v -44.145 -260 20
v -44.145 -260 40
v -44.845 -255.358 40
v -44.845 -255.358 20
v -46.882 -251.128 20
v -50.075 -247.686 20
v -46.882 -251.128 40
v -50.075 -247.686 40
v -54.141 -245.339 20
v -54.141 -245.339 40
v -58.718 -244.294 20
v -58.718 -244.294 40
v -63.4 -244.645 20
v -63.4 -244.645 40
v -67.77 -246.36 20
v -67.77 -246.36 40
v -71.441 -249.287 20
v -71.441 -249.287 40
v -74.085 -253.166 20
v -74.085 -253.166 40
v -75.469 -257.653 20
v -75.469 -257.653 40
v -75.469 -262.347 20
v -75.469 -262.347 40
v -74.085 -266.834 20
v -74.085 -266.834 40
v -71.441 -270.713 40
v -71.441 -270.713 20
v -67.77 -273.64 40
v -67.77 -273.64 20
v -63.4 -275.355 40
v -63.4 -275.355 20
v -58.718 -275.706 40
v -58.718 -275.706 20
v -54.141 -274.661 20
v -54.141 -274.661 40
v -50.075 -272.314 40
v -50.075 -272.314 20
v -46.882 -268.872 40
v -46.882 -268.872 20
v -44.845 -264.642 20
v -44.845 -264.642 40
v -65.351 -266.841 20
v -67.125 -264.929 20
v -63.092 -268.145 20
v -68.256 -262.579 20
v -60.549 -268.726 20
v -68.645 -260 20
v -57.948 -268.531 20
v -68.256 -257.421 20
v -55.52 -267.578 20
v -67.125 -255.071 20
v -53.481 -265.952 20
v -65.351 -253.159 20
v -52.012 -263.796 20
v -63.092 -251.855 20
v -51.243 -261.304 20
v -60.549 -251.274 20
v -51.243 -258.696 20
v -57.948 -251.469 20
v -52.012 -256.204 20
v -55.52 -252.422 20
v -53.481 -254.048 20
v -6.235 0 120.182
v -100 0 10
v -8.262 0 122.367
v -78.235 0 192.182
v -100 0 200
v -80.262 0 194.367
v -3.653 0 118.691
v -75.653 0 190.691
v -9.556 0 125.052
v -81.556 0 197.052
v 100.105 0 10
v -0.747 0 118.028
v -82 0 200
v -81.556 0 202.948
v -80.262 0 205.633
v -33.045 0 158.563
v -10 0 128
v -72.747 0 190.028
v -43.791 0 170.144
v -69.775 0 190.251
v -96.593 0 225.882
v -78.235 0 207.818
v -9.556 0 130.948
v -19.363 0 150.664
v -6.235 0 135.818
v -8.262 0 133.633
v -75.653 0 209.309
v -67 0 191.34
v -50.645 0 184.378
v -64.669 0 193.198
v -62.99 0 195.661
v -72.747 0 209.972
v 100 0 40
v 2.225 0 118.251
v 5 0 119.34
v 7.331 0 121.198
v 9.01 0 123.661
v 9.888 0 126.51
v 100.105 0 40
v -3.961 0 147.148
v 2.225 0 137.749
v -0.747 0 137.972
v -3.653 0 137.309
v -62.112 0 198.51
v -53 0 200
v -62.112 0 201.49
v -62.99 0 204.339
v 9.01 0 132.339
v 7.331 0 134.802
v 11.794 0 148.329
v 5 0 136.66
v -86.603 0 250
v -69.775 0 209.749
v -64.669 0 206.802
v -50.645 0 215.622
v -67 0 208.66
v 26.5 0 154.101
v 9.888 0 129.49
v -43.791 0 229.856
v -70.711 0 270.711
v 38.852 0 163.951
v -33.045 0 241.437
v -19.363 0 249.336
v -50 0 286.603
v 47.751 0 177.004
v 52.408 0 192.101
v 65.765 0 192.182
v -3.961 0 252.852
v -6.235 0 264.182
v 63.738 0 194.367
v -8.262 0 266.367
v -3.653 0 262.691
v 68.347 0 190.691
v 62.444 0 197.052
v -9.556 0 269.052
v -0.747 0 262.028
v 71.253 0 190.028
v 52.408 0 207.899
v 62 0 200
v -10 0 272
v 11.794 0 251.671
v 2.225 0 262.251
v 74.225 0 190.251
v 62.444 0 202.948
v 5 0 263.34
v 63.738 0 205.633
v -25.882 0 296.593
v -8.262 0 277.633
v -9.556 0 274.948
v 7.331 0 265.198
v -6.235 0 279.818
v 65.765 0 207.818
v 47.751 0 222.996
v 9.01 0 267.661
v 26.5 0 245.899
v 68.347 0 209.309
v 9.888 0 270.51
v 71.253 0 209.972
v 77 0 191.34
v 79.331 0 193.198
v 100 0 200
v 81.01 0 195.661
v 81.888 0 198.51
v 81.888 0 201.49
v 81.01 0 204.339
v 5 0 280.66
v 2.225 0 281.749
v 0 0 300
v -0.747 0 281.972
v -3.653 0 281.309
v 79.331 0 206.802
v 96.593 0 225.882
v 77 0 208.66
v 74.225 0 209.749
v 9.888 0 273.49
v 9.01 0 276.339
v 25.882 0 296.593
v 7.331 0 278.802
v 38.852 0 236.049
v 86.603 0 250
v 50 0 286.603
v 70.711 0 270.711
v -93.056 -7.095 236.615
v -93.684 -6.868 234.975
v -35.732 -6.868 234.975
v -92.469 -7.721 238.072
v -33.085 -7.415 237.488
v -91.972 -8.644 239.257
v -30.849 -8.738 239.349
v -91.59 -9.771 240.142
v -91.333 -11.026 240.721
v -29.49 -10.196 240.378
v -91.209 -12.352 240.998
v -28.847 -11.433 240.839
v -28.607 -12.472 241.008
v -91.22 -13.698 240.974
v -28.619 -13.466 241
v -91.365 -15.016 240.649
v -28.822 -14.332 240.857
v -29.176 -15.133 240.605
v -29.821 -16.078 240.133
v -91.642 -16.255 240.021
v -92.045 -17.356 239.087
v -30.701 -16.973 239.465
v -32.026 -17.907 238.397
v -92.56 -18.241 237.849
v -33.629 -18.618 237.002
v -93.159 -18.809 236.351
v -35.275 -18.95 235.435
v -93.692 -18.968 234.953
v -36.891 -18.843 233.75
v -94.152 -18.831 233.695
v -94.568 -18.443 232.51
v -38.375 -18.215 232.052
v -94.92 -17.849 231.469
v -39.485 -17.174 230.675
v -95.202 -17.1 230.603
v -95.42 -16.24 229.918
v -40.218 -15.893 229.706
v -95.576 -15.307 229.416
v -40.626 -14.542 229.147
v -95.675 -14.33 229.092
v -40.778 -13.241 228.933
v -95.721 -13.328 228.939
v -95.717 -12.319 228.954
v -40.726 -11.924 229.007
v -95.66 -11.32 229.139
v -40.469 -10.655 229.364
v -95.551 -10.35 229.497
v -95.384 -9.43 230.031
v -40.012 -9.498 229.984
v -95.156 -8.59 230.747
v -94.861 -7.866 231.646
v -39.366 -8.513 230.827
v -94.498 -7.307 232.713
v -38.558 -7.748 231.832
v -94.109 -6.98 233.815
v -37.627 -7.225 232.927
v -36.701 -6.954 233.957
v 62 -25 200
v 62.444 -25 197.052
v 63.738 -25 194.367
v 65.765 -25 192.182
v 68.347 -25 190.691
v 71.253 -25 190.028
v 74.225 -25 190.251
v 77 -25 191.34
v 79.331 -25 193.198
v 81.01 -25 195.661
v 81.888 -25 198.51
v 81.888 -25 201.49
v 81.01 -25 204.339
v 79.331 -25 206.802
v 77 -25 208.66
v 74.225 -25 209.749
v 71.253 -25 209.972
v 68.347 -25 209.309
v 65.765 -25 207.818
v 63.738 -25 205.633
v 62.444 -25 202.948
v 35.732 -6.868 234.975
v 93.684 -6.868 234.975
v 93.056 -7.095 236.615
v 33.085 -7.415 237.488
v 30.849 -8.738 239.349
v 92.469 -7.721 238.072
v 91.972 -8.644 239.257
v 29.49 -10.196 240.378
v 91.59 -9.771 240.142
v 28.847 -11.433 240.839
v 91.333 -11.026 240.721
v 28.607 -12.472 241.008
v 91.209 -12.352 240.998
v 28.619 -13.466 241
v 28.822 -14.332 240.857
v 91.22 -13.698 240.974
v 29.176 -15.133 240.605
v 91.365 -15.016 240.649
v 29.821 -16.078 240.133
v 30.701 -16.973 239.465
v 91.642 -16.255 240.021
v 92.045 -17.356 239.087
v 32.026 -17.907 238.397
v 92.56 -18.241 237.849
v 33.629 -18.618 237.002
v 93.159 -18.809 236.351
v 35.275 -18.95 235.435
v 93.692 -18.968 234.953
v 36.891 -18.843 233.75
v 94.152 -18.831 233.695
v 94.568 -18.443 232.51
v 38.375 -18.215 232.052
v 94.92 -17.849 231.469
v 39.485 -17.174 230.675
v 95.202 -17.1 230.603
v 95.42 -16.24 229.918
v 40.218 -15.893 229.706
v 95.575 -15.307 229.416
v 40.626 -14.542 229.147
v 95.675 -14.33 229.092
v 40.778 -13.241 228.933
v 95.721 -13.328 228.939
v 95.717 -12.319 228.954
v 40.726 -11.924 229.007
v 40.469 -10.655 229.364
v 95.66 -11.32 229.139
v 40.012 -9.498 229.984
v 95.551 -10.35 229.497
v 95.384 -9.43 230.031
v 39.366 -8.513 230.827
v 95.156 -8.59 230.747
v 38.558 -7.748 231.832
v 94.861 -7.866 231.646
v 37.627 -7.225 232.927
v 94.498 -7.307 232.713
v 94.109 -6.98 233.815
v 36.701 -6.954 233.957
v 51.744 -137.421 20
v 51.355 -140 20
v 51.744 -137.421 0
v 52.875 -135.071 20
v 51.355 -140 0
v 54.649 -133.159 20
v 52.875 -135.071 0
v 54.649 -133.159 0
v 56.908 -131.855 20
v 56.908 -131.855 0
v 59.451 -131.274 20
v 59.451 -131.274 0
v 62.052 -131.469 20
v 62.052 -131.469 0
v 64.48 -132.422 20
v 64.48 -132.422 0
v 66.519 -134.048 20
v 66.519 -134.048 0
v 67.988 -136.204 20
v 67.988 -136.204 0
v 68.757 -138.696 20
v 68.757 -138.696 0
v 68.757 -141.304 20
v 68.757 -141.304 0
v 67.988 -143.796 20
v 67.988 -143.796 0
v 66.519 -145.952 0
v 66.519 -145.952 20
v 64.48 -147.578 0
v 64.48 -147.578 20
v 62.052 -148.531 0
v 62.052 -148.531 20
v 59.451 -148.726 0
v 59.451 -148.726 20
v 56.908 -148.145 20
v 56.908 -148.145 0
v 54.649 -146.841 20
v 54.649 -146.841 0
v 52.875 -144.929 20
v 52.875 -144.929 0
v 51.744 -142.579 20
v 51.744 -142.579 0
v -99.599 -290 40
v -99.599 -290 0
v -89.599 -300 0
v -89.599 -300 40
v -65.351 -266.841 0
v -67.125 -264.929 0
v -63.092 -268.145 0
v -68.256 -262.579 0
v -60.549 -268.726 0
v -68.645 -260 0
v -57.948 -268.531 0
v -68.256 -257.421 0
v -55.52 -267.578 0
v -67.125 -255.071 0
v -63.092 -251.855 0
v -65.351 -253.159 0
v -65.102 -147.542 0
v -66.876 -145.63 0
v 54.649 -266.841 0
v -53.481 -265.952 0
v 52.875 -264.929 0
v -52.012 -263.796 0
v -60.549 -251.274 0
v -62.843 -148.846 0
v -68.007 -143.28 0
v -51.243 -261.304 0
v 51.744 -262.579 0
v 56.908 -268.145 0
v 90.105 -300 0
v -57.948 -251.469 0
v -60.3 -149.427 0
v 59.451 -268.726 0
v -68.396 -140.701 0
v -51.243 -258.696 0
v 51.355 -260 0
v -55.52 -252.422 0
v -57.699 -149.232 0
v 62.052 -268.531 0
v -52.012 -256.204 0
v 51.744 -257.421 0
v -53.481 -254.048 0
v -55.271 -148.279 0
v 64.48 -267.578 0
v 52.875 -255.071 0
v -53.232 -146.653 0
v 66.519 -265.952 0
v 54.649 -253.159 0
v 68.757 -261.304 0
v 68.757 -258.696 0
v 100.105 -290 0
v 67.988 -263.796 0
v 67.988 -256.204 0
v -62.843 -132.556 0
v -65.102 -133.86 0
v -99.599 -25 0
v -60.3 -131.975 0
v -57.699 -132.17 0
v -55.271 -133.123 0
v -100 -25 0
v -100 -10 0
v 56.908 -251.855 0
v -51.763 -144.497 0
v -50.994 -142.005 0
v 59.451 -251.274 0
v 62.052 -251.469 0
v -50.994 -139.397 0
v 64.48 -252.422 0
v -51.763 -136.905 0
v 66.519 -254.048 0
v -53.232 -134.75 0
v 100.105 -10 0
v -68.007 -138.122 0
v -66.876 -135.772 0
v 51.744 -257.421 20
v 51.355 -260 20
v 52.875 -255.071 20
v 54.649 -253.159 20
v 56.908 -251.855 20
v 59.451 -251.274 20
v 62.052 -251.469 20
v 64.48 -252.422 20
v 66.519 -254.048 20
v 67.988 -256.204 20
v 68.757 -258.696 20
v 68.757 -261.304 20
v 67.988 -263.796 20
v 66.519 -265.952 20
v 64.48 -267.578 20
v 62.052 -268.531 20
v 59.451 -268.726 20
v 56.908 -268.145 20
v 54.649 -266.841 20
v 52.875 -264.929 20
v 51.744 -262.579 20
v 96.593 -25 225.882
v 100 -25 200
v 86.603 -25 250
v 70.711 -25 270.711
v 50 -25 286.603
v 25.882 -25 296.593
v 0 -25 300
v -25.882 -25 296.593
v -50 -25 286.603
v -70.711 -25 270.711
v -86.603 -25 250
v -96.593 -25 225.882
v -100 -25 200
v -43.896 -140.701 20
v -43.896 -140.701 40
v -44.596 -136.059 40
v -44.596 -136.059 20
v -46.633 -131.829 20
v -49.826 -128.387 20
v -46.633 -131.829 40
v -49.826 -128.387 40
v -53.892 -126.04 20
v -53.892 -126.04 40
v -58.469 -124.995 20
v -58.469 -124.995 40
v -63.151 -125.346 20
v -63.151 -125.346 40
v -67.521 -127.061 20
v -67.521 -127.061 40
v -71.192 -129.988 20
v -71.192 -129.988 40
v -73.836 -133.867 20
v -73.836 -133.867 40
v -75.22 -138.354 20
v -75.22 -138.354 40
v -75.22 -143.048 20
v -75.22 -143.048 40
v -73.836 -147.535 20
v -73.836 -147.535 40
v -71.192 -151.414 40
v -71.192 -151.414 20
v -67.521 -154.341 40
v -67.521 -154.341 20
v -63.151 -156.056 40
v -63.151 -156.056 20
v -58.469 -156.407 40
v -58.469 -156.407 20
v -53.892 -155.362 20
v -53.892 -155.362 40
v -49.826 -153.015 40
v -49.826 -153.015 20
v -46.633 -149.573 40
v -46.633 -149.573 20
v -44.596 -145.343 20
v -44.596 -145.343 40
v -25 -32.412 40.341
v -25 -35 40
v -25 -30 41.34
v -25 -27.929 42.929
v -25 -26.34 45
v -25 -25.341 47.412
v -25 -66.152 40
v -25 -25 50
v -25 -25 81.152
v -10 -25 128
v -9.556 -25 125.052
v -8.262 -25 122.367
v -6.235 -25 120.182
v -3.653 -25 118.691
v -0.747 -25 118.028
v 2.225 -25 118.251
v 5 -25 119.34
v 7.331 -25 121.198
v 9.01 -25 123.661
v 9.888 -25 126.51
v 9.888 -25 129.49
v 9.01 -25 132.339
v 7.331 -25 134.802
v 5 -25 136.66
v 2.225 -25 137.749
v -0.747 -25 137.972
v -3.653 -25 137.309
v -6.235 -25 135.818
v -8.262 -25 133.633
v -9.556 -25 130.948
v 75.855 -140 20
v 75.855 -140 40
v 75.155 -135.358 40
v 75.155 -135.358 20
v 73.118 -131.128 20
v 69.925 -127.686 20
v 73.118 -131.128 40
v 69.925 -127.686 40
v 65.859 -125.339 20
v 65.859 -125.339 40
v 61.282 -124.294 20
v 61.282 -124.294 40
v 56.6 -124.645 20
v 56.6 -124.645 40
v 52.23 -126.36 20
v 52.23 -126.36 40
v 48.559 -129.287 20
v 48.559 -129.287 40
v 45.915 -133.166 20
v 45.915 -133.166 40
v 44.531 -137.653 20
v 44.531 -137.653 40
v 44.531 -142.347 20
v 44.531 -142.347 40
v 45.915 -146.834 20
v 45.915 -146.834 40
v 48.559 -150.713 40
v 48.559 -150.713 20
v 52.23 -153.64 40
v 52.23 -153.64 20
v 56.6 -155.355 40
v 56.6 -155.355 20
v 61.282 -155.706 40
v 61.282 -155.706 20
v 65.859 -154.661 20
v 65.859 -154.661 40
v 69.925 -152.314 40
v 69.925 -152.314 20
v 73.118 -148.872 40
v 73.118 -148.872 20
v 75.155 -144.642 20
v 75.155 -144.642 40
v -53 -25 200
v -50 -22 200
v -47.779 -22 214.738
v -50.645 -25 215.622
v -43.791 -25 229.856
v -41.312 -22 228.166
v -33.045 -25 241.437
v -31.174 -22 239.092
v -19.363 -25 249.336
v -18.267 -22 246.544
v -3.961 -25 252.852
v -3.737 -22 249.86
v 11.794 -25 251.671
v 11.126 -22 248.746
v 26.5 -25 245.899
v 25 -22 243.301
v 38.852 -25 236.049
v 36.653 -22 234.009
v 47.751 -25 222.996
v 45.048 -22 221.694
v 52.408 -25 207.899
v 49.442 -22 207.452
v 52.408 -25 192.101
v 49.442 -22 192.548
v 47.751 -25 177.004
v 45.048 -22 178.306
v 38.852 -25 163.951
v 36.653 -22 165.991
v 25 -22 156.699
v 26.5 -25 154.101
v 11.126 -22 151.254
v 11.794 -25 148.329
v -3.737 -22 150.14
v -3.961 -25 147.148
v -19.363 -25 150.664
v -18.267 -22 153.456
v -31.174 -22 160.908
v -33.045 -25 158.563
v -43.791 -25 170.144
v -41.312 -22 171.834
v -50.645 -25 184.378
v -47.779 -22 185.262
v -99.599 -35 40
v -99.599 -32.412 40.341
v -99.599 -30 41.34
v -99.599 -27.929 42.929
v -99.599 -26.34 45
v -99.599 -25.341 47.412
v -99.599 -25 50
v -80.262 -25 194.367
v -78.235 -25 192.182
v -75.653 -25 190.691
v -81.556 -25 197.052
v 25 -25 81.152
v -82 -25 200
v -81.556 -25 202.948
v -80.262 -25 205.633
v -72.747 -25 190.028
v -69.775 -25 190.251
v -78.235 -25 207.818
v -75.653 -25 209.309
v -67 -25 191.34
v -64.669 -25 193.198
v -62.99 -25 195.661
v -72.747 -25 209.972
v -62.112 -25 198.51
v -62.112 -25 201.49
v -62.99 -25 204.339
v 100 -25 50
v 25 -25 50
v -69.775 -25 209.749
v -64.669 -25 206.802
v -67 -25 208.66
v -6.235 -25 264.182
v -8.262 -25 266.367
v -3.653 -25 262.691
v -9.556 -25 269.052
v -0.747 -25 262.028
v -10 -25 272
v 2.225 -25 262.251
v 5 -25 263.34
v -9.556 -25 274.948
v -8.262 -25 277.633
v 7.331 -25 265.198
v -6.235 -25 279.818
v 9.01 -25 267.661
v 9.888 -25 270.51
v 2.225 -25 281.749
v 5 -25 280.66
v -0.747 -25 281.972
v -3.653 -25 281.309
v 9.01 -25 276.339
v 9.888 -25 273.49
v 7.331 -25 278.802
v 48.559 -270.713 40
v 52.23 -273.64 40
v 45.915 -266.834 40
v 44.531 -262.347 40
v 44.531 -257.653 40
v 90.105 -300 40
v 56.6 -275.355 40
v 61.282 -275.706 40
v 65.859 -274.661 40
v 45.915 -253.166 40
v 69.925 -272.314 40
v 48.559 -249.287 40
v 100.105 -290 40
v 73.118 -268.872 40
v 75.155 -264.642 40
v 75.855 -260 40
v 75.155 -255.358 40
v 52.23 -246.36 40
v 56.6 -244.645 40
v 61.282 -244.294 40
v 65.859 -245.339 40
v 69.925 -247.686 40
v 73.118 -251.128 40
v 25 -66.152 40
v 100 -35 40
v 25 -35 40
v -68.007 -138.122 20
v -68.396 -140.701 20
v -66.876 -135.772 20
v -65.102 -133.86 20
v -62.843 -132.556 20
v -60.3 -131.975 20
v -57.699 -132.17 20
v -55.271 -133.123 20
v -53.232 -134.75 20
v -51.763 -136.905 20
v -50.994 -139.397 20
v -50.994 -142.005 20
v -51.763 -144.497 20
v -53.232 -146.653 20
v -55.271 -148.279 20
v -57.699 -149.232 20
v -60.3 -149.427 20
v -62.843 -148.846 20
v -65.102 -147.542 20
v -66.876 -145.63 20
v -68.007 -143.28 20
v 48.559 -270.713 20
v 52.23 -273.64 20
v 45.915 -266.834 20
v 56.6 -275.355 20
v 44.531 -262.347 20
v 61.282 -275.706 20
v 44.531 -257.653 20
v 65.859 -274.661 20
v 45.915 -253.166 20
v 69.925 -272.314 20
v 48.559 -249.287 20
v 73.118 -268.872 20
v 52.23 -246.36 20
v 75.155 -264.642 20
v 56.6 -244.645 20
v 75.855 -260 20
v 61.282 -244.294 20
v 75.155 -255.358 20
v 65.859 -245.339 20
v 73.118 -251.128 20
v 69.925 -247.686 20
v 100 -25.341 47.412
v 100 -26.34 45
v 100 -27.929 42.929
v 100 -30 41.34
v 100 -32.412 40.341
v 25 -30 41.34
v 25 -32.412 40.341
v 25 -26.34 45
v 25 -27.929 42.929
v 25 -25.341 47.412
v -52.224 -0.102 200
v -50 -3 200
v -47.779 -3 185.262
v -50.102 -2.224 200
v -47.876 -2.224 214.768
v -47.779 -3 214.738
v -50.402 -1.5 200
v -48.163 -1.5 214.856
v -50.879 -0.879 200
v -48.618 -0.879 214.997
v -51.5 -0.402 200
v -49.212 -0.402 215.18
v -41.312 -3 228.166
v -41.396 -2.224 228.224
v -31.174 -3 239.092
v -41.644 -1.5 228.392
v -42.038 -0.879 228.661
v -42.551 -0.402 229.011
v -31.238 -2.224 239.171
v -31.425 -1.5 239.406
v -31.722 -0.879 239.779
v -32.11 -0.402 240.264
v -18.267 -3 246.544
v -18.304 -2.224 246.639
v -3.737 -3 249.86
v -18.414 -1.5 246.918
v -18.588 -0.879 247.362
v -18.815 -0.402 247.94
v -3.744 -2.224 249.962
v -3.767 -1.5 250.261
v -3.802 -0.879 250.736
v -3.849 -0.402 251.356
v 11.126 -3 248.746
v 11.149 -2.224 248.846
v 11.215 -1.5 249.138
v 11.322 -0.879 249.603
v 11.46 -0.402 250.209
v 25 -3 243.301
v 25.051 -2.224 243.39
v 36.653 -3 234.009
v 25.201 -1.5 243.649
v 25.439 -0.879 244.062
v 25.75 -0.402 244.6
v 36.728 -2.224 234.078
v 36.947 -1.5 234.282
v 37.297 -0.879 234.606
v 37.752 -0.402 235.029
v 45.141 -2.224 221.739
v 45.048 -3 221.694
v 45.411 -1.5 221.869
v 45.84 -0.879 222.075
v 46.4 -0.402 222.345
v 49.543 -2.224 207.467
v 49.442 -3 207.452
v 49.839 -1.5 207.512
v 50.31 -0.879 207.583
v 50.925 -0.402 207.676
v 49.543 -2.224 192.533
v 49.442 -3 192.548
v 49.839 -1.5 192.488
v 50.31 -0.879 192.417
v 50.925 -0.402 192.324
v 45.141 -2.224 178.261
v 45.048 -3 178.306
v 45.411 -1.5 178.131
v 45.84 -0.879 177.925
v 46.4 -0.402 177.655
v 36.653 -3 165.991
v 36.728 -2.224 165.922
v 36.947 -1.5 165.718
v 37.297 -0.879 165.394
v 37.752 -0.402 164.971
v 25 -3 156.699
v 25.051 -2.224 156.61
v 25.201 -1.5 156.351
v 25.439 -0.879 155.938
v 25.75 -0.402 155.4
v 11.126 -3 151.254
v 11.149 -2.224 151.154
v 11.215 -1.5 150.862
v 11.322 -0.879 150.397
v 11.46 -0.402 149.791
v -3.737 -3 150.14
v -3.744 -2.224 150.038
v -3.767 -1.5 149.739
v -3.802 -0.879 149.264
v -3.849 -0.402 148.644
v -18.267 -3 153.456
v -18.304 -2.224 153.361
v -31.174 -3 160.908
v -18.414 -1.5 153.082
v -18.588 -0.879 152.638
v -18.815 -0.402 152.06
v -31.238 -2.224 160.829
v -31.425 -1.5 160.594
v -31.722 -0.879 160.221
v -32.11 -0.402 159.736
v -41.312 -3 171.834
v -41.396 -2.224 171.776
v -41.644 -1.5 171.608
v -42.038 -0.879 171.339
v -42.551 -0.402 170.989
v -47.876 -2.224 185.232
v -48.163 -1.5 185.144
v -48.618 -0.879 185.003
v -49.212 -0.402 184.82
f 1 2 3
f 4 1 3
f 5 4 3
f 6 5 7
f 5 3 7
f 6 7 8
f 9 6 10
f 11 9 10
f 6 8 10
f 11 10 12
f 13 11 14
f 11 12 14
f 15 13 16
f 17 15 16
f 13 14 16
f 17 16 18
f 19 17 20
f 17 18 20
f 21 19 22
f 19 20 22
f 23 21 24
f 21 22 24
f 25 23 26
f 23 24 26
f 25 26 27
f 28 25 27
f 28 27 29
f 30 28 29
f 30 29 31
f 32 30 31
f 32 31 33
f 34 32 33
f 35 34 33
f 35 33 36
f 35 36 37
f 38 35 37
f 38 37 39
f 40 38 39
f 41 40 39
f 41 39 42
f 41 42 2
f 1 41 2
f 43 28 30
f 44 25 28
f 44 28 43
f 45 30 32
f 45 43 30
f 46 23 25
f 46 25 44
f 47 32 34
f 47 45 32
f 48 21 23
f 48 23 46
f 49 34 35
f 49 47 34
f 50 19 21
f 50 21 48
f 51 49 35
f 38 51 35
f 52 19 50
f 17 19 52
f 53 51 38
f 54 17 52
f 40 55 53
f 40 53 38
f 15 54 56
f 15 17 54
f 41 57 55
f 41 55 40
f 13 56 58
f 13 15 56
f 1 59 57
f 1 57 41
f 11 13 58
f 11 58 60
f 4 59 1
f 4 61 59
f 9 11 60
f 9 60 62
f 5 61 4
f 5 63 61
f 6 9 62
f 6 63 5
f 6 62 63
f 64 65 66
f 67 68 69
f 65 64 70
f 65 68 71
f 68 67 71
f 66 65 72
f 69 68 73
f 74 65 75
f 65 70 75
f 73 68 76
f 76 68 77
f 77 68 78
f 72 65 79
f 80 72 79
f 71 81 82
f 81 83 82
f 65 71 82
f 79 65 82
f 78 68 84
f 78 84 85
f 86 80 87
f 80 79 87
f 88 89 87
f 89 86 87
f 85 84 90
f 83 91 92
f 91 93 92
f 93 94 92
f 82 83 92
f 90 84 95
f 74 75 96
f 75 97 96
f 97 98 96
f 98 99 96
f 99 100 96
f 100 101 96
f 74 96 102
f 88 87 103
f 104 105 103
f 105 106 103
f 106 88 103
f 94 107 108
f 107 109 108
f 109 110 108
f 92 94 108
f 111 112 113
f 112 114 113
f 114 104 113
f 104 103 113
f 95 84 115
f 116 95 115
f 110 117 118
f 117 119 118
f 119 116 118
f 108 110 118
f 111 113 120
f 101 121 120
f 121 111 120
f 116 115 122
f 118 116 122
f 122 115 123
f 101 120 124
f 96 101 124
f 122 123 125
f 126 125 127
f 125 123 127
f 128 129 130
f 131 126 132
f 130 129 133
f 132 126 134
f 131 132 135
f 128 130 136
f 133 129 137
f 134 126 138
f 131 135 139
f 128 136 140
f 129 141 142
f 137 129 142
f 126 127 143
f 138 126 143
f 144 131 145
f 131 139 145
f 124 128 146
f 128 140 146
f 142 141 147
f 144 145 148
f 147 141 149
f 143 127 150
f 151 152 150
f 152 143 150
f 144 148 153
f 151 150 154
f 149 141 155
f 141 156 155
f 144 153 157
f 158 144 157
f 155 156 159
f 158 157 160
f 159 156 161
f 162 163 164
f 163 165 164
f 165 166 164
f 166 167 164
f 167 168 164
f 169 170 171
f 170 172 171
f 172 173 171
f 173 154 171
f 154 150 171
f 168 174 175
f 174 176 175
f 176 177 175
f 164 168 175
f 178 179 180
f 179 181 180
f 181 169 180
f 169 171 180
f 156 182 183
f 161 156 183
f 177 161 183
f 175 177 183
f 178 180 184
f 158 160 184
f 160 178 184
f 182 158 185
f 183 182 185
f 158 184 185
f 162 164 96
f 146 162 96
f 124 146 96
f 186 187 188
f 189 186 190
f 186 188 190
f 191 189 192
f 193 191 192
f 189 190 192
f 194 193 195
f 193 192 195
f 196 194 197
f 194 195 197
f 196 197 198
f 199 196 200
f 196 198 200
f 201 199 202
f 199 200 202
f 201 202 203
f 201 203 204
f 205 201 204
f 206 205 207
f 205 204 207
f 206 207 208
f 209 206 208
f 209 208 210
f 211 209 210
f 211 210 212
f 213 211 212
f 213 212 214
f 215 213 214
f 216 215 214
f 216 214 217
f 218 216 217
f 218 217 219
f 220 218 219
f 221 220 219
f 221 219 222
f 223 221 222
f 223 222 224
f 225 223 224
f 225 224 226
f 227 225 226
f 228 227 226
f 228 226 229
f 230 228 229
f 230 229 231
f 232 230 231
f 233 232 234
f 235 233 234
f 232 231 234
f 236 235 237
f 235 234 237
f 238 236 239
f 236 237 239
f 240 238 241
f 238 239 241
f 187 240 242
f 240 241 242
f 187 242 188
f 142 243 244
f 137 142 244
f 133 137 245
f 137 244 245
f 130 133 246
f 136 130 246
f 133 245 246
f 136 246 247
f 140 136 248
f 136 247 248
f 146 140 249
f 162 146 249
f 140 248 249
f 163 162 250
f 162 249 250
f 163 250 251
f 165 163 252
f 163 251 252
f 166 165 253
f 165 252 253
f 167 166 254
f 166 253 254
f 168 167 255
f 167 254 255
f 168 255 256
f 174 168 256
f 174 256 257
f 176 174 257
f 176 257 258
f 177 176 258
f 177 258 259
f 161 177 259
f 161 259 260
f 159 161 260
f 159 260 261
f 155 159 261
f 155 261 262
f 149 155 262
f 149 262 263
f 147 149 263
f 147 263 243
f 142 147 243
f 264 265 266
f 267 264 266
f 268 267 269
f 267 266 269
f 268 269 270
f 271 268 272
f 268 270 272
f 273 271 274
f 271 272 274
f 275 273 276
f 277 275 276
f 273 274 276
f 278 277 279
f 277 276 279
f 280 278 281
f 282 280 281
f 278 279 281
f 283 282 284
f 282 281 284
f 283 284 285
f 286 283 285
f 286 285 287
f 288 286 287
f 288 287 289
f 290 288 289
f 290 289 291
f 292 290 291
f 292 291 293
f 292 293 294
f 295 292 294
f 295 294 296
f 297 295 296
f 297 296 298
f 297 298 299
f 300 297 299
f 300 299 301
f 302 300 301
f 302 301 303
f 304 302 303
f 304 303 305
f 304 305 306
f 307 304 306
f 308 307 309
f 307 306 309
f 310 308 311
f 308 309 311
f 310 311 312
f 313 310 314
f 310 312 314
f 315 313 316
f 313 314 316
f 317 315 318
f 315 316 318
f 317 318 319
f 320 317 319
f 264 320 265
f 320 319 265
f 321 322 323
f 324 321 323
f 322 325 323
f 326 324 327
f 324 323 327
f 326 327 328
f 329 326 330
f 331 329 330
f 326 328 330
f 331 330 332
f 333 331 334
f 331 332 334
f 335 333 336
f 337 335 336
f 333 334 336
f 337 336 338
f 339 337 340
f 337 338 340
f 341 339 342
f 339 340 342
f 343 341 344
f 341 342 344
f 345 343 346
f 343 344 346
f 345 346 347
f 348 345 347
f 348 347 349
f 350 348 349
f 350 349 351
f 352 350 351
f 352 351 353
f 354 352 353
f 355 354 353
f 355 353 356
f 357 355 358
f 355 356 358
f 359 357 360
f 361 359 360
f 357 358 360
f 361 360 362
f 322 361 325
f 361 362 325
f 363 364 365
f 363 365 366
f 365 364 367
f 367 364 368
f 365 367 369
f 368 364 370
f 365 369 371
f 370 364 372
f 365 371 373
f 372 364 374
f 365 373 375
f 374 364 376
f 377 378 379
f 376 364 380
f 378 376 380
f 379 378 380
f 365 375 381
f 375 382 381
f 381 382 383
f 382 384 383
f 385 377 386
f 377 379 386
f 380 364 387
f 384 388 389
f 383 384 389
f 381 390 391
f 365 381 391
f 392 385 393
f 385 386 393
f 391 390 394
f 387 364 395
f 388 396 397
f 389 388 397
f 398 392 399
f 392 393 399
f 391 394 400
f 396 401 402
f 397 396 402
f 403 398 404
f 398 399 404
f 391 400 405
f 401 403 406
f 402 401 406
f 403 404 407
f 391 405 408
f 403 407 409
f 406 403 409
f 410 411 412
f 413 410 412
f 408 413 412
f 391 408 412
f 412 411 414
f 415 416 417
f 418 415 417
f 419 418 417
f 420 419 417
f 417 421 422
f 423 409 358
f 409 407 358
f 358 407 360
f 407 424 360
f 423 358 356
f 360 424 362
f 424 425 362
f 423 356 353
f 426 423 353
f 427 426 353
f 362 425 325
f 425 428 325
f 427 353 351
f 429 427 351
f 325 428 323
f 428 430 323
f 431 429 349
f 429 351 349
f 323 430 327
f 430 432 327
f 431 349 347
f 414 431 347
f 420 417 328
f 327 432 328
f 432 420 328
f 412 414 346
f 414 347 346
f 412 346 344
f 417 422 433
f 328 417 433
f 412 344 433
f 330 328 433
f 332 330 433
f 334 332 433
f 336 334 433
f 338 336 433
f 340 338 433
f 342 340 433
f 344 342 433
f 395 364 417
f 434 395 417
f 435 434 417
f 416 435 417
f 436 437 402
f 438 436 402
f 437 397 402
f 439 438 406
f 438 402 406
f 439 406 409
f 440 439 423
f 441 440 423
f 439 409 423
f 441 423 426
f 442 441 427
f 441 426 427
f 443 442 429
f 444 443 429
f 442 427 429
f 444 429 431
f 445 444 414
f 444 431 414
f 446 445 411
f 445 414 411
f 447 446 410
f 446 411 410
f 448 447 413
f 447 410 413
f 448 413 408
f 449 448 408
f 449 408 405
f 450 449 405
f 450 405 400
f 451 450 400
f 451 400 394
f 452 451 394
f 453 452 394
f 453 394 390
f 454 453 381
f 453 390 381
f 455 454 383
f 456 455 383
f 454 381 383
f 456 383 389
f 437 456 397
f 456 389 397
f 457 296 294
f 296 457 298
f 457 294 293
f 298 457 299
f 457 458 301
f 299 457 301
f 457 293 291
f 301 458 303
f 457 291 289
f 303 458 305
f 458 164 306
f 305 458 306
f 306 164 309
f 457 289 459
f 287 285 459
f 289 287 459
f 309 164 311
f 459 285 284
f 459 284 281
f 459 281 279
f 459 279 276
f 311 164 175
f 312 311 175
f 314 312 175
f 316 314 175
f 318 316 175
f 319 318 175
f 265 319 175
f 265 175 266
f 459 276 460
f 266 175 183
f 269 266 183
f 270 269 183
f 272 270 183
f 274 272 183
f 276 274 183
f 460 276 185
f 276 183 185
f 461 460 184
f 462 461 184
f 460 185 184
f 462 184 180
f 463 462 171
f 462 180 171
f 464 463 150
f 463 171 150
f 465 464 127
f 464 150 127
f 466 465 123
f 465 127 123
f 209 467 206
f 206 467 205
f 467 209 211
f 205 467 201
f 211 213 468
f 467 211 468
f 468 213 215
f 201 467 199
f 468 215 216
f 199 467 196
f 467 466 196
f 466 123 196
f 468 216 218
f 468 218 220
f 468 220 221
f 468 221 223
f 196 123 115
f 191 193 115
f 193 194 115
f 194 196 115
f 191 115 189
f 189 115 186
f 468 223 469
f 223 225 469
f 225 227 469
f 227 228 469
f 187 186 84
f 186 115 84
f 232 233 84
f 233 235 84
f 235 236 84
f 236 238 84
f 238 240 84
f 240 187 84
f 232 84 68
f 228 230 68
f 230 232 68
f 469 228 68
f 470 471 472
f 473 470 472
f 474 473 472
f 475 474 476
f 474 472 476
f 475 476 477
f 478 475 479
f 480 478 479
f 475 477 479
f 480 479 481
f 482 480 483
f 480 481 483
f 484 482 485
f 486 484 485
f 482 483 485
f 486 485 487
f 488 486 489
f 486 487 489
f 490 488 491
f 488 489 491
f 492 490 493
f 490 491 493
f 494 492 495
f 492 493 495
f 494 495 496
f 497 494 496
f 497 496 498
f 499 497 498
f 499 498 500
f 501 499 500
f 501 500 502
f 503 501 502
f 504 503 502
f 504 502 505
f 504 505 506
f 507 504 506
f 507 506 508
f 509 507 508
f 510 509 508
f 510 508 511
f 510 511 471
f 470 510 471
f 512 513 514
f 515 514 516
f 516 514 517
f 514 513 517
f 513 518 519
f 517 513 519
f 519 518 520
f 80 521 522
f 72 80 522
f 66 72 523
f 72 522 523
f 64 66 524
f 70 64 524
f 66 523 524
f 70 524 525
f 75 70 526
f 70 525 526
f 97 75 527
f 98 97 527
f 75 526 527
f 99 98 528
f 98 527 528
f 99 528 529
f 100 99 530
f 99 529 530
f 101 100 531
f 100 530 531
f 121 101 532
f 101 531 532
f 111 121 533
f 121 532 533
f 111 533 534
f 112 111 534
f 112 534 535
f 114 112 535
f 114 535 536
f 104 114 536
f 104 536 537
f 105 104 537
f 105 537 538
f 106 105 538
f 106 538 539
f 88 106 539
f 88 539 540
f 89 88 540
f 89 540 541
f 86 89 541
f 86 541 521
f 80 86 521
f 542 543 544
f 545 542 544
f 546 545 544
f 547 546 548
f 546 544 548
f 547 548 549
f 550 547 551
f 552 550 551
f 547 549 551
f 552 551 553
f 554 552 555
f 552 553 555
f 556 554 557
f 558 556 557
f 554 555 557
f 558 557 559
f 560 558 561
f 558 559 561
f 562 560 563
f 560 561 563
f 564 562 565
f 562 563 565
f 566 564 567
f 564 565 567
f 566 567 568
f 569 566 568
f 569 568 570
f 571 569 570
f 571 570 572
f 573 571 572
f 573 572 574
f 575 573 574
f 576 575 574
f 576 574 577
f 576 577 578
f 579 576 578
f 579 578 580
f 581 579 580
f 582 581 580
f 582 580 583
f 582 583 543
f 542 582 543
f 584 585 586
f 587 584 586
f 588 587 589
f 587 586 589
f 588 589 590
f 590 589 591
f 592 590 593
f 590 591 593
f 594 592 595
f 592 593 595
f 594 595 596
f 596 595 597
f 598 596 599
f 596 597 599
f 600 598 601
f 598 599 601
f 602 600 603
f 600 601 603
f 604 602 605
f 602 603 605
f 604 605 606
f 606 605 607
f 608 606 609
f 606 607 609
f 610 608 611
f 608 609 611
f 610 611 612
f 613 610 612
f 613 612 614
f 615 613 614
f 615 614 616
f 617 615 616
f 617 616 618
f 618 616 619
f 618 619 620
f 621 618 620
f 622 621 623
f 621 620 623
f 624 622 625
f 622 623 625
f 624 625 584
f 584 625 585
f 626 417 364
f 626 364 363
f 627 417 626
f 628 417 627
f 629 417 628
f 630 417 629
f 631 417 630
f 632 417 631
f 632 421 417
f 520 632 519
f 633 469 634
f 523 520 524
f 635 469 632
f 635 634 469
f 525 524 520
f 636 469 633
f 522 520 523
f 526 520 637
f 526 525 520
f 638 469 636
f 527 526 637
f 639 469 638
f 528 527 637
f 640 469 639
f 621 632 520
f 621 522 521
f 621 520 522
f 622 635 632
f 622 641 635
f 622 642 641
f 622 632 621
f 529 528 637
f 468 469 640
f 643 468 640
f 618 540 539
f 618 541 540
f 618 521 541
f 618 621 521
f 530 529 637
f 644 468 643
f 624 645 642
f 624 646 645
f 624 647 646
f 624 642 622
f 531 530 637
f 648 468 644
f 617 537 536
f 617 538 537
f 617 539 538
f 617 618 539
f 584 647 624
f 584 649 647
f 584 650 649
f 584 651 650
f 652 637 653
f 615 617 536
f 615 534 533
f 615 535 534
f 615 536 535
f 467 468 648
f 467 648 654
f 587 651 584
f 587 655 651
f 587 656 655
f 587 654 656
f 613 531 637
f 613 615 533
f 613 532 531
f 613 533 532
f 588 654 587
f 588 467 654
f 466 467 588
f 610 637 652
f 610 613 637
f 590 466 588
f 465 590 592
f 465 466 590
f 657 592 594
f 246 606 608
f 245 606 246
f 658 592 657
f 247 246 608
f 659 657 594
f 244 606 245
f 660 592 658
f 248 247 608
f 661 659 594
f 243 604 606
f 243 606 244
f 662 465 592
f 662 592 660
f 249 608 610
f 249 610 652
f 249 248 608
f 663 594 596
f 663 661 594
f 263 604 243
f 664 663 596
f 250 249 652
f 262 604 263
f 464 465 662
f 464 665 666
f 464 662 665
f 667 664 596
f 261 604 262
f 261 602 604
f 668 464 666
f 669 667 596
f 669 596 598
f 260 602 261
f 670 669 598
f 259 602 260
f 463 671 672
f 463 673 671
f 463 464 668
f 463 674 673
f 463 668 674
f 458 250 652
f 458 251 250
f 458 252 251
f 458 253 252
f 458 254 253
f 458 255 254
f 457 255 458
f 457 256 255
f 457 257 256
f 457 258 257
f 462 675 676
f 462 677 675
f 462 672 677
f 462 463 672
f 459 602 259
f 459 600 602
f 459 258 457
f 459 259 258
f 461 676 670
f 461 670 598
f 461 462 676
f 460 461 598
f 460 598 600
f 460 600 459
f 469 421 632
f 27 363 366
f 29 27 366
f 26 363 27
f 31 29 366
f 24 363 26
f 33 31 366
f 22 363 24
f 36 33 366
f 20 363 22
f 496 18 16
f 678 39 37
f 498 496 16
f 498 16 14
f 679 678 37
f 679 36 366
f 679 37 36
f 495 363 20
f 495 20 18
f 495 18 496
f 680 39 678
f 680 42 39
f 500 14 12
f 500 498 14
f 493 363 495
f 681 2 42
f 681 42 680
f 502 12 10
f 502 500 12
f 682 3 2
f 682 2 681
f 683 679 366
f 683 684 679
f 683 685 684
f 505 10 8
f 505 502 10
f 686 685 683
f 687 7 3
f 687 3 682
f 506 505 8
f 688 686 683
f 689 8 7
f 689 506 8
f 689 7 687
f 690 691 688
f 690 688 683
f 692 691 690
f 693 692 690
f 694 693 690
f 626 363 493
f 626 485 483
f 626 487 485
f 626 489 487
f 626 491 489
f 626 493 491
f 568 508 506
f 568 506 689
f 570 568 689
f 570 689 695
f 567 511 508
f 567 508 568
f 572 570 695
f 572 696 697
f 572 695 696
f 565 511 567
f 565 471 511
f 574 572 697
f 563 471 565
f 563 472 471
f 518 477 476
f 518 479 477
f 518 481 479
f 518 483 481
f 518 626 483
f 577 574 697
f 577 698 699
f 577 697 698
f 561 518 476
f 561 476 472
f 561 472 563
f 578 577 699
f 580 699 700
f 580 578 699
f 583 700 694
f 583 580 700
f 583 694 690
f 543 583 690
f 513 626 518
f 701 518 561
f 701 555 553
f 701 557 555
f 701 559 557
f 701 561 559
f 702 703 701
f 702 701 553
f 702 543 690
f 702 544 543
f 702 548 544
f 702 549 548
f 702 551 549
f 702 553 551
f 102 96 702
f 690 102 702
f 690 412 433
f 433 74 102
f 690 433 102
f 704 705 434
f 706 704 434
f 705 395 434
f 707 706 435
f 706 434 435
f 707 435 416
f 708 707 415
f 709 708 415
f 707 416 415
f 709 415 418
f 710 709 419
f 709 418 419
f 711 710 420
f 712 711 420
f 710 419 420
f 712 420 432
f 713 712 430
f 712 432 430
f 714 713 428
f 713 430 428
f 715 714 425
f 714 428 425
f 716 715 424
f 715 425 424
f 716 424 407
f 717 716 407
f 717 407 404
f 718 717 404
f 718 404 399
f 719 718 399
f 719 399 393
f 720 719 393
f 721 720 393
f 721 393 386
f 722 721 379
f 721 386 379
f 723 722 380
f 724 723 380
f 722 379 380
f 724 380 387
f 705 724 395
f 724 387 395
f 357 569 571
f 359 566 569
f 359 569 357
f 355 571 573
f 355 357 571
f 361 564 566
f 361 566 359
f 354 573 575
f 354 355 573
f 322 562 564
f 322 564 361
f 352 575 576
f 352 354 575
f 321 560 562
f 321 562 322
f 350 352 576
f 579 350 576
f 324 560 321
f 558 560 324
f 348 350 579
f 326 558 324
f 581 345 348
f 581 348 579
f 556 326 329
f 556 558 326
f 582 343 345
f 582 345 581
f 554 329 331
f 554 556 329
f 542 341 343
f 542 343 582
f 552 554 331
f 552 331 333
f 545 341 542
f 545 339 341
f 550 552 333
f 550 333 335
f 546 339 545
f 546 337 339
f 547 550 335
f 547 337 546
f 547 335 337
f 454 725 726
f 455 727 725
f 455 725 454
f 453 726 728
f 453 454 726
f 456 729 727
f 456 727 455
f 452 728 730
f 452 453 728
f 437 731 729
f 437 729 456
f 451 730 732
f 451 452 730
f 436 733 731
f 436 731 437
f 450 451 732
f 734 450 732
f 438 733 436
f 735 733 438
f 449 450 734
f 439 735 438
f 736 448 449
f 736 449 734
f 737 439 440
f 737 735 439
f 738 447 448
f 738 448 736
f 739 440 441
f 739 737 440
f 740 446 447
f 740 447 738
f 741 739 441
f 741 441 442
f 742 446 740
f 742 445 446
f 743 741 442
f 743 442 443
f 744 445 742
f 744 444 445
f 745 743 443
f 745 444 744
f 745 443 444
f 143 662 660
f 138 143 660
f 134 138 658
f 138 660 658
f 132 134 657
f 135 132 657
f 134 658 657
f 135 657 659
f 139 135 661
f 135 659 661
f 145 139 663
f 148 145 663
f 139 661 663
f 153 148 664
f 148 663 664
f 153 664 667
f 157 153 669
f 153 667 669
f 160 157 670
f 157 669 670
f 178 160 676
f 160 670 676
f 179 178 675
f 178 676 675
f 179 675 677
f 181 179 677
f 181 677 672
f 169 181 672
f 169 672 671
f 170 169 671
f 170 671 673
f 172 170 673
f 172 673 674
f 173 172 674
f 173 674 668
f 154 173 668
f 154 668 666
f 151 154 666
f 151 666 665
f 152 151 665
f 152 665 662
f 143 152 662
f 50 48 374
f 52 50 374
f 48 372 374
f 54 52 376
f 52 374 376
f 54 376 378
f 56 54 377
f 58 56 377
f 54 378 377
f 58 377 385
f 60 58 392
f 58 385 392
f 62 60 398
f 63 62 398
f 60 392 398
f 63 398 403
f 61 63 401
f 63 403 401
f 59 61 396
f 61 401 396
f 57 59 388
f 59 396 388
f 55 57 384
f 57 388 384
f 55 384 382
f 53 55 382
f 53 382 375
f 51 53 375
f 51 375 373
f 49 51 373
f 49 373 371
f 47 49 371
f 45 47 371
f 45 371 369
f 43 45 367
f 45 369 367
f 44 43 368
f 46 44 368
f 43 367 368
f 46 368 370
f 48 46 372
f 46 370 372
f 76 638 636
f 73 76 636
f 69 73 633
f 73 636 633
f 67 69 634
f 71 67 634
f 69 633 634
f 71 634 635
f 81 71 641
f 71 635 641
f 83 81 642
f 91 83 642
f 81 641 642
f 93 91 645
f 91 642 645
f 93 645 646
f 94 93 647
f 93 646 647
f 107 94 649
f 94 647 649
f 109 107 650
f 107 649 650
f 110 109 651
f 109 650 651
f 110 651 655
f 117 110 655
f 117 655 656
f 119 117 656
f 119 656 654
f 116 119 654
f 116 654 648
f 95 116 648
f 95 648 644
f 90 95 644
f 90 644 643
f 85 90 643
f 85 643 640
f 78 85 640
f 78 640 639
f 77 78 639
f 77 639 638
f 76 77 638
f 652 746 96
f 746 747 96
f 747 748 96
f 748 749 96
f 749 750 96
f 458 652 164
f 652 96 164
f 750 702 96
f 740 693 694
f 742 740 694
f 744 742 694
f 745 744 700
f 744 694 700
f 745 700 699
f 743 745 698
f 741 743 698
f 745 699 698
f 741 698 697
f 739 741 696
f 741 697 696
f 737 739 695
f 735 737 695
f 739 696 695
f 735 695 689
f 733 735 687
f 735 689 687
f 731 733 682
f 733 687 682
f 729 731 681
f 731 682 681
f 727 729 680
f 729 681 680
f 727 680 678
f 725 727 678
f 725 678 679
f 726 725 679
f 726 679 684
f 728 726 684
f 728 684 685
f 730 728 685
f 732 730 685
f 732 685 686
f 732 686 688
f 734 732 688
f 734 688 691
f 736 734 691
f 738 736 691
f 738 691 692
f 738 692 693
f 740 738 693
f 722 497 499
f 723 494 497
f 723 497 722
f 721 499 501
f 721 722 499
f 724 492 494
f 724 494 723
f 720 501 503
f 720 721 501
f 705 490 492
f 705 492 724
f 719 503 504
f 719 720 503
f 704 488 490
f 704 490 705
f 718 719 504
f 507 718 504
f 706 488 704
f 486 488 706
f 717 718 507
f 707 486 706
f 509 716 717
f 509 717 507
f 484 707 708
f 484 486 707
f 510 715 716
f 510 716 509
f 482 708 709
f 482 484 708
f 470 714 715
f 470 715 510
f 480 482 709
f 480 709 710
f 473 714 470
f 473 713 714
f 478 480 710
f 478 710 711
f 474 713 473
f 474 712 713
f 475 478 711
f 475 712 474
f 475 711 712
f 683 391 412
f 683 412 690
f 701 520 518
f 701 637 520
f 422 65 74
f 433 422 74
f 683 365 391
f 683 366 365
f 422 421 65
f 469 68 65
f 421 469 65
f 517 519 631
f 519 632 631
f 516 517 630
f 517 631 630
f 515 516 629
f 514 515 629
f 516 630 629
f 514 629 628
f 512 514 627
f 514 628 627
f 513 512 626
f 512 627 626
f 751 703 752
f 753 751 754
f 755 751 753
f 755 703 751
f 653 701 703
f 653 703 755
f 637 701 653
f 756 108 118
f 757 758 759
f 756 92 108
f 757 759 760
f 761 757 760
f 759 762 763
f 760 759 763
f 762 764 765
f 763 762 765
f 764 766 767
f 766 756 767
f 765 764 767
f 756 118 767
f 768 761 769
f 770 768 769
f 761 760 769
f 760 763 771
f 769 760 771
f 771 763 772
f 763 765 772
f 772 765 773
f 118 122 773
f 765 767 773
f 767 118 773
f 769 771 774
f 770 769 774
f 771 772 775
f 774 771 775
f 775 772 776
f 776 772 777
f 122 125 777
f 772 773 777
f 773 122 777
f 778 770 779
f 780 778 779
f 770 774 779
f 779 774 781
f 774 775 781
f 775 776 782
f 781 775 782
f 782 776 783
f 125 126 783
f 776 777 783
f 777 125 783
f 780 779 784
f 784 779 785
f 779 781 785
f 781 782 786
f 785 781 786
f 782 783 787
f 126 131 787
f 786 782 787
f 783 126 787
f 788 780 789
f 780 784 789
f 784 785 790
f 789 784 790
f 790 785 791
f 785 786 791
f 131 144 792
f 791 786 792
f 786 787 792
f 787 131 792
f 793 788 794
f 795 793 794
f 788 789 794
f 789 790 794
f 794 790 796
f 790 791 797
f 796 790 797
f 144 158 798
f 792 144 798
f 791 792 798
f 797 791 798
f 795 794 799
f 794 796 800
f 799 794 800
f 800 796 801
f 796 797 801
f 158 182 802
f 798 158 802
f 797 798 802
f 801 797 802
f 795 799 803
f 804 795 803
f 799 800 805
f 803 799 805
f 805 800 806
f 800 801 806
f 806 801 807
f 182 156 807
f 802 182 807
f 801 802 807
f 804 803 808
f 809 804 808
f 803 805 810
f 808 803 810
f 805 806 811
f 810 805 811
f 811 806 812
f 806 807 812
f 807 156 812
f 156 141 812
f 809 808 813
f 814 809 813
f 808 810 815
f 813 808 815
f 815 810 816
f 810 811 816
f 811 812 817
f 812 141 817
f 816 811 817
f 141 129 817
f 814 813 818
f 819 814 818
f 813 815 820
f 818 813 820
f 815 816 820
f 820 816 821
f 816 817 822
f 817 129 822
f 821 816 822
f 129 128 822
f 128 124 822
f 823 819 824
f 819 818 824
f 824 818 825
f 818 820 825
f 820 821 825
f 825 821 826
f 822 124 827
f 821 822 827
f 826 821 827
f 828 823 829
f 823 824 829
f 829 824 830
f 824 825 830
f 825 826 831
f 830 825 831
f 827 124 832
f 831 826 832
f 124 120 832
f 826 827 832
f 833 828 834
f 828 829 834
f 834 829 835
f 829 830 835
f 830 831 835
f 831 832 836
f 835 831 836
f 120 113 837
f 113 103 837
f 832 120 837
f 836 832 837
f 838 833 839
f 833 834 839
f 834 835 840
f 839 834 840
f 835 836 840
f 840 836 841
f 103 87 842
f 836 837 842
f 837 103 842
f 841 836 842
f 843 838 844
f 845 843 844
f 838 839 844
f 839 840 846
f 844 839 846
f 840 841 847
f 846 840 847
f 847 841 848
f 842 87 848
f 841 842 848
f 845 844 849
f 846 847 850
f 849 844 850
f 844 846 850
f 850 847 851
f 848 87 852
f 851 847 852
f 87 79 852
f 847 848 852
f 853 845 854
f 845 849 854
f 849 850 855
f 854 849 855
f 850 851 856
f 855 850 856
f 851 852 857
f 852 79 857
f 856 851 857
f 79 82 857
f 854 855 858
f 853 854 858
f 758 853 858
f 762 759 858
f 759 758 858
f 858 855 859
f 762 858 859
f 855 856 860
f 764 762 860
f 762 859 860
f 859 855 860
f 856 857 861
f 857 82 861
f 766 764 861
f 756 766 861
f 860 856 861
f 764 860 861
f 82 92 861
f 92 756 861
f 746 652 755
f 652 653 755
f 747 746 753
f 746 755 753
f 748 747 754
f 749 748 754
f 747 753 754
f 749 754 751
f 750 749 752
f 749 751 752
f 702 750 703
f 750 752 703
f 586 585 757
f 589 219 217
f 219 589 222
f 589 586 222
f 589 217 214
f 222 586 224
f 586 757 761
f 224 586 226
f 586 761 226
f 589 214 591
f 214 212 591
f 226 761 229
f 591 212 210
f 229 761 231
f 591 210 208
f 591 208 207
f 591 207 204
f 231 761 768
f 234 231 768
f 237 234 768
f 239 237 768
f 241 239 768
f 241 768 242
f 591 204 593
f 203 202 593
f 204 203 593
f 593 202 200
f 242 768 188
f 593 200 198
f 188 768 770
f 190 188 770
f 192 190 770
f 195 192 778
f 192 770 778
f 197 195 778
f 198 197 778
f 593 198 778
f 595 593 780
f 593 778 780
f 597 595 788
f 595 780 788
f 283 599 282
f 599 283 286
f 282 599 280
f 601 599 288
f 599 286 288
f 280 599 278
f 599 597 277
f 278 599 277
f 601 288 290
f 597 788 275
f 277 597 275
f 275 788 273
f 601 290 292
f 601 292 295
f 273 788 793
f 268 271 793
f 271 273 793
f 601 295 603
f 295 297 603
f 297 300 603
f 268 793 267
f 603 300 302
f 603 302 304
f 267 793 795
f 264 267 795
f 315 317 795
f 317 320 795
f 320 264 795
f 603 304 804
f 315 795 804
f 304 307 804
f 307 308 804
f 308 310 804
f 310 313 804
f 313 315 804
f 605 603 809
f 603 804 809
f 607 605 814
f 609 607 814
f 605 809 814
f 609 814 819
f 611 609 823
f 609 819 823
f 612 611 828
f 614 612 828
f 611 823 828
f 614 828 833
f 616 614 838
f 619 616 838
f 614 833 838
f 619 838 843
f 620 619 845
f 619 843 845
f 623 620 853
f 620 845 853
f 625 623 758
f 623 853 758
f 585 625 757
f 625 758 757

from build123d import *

# Parameters (mm, degrees)
F0_R           = 10
F1_DEPTH       = 25
F2_D           = 20
F3_W           = 199.7033953667
F3_H           = 40
F4_DEPTH       = 300
F6_DEPTH       = 25
F8_D           = 17.5
F8_CBORE_D     = 31.5
F8_CBORE_DEPTH = 20
F9_SIZE        = 10
F10_SIZE       = 3
F11_R          = 3
F12_R          = 10
F14_D          = 12.1
F15_SIZE       = 10


with BuildPart() as f1:
    # F0 (on Front) → F1 (new body)
    with BuildSketch(Plane.XZ):
        with BuildLine():
            Line((-100, 200), (-100, 0))
            Line((-100, 0), (100, 0))
            Line((100, 0), (100, 200))
            Line((100, 200), (82, 200))
            ThreePointArc((82, 200), (72, 190), (62, 200))
            Line((62, 200), (50, 200))
            ThreePointArc((50, 200), (0, 150), (-50, 200))
            Line((-50, 200), (-62, 200))
            ThreePointArc((-62, 200), (-72, 190), (-82, 200))
            Line((-82, 200), (-100, 200))
        make_face()
        with Locations((0, 128)):
            Circle(F0_R, mode=Mode.SUBTRACT)
        with BuildLine():
            ThreePointArc((100, 200), (0, 300), (-100, 200))
            Line((-100, 200), (-82, 200))
            ThreePointArc((-82, 200), (-72, 210), (-62, 200))
            Line((-62, 200), (-50, 200))
            ThreePointArc((-50, 200), (0, 250), (50, 200))
            Line((50, 200), (62, 200))
            ThreePointArc((62, 200), (72, 210), (82, 200))
            Line((82, 200), (100, 200))
        make_face()
        with Locations((0, 272)):
            Circle(F0_R, mode=Mode.SUBTRACT)
        with BuildLine():
            ThreePointArc((62, 200), (72, 190), (82, 200))
            Line((82, 200), (62, 200))
        make_face()
        with BuildLine():
            Line((62, 200), (82, 200))
            ThreePointArc((82, 200), (72, 210), (62, 200))
        make_face()
        with BuildLine():
            ThreePointArc((-62, 200), (-72, 210), (-82, 200))
            Line((-82, 200), (-62, 200))
        make_face()
        with BuildLine():
            Line((-62, 200), (-82, 200))
            ThreePointArc((-82, 200), (-72, 190), (-62, 200))
        make_face()
        with Locations((0, 272)):
            Circle(F0_R)
        with Locations((0, 128)):
            Circle(F0_R)
    extrude(amount=F1_DEPTH)

    # F2 (through all)
    with Locations(Plane(origin=(0, 0, 0), x_dir=(1, 0, 0), z_dir=(0, 1, 0))):
        with Locations((0, -272), (72, -200), (0, -128), (-72, -200)):
            Hole(F2_D / 2)

    # F3 (on Front) → F4 (join)
    with BuildSketch(Plane.XZ):
        with Locations((0.2531558275, 20)):
            Rectangle(F3_W, F3_H)
    extrude(amount=F4_DEPTH)

    # F5 (on Right) → F6 (join, symmetric)
    with BuildSketch(Plane.YZ):
        Polygon((-66.1523267627, 40), (-25, 40), (-25, 81.1523267627), align=None)
    extrude(amount=F6_DEPTH, both=True)

    # F8 (through all)
    with Locations(Plane.XY.offset(40)):
        with Locations((-59.6462091353, -140.7010122926), (60.1048535109, -140), (60.1048535109, -260), (-59.8951464891, -260)):
            CounterBoreHole(F8_D / 2, F8_CBORE_D / 2, F8_CBORE_DEPTH)

    # F9
    f9_edges = [f1.edges().sort_by_distance(p)[0] for p in [
        (-99.598542, -300, 20),
        (100.104854, -300, 20),
    ]]
    chamfer(f9_edges, length=F9_SIZE)

    # F10
    f10_edges = [f1.edges().sort_by_distance(p)[0] for p in [
        (50, -25, 200),
    ]]
    chamfer(f10_edges, length=F10_SIZE)

    # F11
    f11_edges = [f1.edges().sort_by_distance(p)[0] for p in [
        (50, 0, 200),
    ]]
    fillet(f11_edges, radius=F11_R)

    # F12
    f12_edges = [f1.edges().sort_by_distance(p)[0] for p in [
        (-62.299271, -25, 40),
        (62.5, -25, 40),
    ]]
    fillet(f12_edges, radius=F12_R)

    # F14 (through all)
    with Locations(Plane(origin=(-100, 0, 0), x_dir=(0, -1, 0), z_dir=(-1, 0, 0))):
        with Locations((12.9178790376, 234.974578023)):
            Hole(F14_D / 2)

    # F15
    f15_edges = [f1.edges().sort_by_distance(p)[0] for p in [
        (0.052427, 0, 0),
    ]]
    chamfer(f15_edges, length=F15_SIZE)


solid = f1.part
